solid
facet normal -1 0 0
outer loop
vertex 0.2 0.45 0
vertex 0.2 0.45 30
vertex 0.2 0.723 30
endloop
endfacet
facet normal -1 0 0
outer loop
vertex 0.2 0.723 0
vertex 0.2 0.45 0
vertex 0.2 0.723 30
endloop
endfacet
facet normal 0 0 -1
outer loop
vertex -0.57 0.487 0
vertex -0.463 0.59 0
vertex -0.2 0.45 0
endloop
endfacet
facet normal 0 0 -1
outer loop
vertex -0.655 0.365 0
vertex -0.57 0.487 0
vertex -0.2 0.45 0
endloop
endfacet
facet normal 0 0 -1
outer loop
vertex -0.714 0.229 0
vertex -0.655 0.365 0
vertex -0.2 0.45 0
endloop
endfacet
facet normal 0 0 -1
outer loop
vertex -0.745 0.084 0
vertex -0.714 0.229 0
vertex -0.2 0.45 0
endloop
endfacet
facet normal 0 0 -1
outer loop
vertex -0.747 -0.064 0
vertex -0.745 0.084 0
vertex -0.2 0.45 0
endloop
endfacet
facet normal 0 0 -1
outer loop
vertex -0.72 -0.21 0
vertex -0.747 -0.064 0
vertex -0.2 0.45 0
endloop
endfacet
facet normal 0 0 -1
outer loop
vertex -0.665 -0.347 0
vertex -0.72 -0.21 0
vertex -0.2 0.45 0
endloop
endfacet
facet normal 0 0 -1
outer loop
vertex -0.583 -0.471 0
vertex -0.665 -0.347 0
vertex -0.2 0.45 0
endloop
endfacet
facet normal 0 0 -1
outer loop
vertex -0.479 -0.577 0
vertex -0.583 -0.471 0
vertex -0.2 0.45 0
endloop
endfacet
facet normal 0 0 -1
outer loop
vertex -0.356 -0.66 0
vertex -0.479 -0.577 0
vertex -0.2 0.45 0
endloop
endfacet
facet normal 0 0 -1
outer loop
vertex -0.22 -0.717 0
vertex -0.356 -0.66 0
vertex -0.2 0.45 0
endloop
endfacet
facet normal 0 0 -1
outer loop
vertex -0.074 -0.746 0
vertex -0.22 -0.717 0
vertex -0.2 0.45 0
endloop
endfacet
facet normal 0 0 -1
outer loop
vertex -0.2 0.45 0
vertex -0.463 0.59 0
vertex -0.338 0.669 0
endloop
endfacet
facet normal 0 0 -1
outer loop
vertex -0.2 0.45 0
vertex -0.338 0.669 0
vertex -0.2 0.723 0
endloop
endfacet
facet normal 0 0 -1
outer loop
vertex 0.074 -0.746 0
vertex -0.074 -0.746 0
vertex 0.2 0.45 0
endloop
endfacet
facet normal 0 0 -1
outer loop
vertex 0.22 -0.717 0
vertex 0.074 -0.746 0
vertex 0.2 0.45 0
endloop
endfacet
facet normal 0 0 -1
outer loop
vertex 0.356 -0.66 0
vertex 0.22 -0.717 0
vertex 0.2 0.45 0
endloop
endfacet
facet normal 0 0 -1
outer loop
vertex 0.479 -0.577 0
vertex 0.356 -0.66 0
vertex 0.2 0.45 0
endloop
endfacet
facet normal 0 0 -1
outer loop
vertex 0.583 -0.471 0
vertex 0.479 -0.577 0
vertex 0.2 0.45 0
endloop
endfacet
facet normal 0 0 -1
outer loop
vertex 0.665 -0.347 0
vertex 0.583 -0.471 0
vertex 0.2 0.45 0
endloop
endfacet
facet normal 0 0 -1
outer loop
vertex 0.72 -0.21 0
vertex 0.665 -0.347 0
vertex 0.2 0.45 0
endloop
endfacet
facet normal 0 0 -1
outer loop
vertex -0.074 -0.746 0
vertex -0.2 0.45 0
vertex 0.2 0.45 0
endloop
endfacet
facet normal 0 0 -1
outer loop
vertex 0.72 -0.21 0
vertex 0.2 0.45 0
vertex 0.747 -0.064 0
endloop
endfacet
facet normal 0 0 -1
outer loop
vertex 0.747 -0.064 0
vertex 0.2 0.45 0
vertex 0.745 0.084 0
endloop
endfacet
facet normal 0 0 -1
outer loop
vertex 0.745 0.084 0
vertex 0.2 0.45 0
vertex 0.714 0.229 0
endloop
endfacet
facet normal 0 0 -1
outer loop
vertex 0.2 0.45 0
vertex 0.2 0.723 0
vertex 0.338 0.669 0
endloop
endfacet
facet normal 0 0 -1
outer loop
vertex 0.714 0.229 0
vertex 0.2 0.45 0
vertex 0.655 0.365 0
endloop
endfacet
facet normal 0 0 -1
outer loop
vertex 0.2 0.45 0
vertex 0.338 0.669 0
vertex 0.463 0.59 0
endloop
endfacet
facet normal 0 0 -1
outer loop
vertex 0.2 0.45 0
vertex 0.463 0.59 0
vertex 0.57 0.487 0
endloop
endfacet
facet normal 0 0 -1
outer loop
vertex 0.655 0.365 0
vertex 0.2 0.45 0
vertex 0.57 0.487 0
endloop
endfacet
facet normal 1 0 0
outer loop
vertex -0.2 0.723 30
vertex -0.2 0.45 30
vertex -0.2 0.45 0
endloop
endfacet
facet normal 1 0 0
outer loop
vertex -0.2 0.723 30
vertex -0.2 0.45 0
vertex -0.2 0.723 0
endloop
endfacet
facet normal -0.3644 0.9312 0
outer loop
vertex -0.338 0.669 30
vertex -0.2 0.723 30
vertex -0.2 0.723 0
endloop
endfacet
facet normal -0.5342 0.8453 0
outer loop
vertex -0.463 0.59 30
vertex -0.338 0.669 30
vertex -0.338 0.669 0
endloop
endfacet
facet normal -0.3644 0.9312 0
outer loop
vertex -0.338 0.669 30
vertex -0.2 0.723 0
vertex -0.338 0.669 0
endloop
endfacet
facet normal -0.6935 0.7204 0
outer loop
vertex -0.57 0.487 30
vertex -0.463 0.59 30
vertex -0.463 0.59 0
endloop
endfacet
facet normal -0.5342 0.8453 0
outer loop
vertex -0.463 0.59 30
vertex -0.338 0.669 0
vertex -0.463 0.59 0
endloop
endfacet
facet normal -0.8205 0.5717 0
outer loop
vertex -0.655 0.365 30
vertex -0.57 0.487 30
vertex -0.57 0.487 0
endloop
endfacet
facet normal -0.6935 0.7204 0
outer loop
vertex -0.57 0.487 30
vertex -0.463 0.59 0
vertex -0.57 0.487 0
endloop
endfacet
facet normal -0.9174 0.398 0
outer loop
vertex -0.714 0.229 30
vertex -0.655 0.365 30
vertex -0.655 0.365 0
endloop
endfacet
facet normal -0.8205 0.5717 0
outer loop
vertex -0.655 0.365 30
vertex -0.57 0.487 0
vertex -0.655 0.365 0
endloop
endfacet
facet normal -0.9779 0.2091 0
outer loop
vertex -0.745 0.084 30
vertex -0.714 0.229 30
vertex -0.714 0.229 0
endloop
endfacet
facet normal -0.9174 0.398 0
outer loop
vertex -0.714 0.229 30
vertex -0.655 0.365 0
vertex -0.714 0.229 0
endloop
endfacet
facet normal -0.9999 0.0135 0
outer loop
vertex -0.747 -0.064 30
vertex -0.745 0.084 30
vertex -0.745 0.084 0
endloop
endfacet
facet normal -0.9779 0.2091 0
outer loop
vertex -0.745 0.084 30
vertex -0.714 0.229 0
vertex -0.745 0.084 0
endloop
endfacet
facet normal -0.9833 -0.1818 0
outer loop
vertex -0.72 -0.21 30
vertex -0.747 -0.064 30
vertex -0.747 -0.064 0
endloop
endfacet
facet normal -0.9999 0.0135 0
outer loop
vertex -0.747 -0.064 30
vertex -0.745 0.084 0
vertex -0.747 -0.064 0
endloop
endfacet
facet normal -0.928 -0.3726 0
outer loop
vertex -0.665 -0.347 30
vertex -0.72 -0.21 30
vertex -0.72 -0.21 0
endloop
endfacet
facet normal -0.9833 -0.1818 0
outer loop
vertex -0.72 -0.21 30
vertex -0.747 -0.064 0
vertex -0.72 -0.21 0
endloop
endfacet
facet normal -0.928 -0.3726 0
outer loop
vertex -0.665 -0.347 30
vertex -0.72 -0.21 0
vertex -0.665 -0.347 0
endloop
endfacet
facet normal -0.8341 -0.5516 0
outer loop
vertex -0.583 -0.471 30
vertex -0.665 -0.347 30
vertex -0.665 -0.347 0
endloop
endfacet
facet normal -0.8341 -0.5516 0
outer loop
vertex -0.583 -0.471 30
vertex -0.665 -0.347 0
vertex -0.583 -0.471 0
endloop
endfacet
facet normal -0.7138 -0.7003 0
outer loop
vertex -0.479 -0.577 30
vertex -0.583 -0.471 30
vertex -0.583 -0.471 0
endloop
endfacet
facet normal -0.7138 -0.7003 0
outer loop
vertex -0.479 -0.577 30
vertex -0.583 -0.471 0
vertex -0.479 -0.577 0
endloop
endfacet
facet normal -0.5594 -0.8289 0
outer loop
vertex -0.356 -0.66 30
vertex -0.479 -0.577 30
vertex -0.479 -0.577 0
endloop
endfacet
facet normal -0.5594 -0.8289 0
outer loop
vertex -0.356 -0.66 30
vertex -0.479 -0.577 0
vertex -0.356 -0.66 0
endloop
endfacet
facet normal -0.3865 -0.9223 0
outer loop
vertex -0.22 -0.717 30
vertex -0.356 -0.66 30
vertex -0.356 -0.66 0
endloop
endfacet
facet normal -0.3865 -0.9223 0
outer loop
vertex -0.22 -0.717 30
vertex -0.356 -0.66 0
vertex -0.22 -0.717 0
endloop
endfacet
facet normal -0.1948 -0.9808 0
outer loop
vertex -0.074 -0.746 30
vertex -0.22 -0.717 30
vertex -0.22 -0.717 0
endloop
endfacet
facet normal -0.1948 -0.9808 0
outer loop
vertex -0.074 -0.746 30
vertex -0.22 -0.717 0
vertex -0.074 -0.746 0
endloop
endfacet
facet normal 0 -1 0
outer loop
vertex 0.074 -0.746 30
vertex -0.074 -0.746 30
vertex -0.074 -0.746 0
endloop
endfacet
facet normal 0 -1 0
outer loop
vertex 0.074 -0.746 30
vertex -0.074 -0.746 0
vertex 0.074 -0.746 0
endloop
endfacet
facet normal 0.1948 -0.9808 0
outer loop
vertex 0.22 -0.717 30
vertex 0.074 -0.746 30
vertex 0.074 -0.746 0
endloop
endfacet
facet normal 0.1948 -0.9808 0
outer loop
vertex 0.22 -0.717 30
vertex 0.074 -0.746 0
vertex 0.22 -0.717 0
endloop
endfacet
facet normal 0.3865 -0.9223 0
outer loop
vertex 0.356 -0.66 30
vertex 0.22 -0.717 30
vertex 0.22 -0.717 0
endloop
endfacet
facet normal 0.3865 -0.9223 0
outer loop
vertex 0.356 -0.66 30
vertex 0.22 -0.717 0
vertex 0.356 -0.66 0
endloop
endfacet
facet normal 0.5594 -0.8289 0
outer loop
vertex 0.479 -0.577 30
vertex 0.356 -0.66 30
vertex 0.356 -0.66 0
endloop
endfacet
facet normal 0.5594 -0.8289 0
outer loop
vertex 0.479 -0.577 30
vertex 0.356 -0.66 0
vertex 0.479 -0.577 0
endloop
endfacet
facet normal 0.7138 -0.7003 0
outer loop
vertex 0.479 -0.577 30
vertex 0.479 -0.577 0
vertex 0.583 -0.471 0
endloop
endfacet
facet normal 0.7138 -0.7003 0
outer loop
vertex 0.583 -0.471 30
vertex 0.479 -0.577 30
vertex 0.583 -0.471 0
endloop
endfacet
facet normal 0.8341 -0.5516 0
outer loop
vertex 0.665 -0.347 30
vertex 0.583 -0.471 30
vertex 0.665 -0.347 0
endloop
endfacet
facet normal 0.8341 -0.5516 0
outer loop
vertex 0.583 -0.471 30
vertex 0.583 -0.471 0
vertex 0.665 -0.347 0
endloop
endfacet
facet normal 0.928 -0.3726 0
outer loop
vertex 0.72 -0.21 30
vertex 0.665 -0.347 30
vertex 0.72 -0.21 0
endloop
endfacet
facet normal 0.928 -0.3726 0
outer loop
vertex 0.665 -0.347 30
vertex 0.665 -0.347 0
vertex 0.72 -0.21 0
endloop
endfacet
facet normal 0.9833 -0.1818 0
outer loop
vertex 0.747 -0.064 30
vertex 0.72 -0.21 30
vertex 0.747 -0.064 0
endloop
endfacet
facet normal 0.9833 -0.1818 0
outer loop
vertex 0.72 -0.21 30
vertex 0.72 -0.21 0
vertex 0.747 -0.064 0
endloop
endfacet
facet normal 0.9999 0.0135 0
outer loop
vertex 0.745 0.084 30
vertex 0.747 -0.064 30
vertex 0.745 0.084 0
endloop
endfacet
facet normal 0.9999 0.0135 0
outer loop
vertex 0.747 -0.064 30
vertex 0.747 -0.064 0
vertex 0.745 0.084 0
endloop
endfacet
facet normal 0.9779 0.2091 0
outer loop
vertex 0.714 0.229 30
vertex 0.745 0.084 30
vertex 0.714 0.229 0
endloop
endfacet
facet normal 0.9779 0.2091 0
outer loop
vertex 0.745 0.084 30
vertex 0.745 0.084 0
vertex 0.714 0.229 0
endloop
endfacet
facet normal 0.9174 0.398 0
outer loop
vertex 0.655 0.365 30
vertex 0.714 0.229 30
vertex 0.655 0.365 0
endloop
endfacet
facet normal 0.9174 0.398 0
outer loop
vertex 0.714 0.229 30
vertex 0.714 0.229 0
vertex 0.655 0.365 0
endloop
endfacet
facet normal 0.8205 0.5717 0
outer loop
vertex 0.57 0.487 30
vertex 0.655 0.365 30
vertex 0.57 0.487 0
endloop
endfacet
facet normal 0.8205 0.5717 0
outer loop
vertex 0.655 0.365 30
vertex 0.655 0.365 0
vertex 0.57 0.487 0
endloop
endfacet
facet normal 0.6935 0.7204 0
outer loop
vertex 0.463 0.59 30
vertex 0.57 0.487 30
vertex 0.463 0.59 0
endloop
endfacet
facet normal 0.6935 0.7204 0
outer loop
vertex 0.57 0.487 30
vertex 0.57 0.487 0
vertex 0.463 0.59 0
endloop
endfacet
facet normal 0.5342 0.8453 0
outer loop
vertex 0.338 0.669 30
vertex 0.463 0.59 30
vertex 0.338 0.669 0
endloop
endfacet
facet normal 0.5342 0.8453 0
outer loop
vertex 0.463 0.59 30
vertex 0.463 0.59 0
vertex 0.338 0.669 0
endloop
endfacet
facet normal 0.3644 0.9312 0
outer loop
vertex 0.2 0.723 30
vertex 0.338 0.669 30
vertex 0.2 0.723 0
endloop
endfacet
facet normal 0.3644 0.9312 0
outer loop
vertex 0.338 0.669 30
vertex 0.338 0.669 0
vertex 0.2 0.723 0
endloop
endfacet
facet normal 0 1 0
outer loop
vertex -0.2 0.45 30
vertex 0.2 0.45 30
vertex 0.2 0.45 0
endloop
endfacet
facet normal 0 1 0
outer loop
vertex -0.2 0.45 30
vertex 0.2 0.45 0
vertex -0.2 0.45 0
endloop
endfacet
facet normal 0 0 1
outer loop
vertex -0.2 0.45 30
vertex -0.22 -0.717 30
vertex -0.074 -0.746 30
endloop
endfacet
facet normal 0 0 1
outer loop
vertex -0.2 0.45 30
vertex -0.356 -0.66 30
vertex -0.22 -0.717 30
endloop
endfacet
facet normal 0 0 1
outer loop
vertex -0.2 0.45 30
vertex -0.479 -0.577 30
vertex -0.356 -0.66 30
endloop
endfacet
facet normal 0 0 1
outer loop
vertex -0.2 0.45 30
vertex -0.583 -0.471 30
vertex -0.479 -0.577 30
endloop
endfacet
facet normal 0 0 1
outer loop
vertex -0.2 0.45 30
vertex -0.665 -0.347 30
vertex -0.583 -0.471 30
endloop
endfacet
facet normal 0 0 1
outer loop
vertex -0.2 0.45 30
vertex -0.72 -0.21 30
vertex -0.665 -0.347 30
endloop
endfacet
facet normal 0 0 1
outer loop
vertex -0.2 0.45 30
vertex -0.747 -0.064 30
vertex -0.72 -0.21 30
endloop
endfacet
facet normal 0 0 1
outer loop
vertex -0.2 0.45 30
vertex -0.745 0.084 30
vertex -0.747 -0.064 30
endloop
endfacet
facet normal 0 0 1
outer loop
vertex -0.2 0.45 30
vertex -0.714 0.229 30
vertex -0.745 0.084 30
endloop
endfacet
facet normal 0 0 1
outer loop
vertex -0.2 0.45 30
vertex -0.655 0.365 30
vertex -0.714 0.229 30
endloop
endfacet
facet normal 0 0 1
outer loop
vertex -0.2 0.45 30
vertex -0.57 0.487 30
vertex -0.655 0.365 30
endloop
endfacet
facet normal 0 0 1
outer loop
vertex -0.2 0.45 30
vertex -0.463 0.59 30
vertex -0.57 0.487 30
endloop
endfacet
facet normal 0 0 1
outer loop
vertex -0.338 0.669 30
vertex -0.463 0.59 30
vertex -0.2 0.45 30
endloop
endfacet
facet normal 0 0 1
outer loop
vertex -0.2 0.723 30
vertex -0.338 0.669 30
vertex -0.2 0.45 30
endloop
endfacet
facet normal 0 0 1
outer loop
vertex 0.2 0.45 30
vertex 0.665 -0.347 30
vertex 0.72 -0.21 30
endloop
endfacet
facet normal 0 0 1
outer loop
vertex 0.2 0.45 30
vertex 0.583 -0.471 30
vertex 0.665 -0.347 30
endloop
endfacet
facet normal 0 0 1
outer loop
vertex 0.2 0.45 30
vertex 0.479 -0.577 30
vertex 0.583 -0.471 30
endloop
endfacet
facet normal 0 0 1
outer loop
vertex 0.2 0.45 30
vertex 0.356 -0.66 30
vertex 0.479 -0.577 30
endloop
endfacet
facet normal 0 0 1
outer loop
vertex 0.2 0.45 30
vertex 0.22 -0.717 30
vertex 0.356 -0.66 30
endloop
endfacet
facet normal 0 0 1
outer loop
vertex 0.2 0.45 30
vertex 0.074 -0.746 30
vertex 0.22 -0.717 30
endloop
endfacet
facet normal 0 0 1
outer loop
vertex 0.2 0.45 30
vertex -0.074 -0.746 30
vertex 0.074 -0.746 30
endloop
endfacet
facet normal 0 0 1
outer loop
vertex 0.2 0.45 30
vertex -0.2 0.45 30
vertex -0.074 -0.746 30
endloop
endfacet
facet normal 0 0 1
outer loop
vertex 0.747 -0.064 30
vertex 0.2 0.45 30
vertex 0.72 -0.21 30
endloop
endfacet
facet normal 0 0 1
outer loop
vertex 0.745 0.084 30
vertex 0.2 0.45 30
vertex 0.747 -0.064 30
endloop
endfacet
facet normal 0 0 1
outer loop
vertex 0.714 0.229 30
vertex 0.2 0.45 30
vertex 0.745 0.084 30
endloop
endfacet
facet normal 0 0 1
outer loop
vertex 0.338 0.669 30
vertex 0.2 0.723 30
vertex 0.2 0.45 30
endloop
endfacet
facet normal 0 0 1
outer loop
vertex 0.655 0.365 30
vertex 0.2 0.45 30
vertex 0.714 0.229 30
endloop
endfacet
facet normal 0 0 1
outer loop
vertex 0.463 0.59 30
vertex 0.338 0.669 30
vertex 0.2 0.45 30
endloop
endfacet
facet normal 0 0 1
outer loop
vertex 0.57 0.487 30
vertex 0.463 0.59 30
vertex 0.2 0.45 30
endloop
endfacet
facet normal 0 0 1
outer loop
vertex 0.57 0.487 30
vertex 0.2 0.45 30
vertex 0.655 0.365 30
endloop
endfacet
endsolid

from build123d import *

# Parameters (mm, degrees)
SKETCH1_R           = 0.75
BOSS_EXTRUDE1_DEPTH = 30
SKETCH3_W           = 0.2
SKETCH3_H           = 0.357534677
CUT_EXTRUDE1_DEPTH  = 31.018744144


with BuildPart() as part:
    # Sketch1 → Boss-Extrude1 (new body)
    with BuildSketch(Plane.XY):
        Circle(SKETCH1_R)
    extrude(amount=BOSS_EXTRUDE1_DEPTH)

    # Sketch3 → Cut-Extrude1 (cut, through all)
    with BuildSketch(Plane.XY.offset(30)):
        with Locations((0.1, 0.628767338)):
            Rectangle(SKETCH3_W, SKETCH3_H)
    cut_extrude1 = extrude(amount=-CUT_EXTRUDE1_DEPTH, mode=Mode.SUBTRACT)

    # Mirror1: Cut-Extrude1 across plane
    add(cut_extrude1.mirror(Plane(origin=(0, 0, 0), x_dir=(0, 0, 1), z_dir=(1, 0, 0))), mode=Mode.SUBTRACT)


solid = part.part
